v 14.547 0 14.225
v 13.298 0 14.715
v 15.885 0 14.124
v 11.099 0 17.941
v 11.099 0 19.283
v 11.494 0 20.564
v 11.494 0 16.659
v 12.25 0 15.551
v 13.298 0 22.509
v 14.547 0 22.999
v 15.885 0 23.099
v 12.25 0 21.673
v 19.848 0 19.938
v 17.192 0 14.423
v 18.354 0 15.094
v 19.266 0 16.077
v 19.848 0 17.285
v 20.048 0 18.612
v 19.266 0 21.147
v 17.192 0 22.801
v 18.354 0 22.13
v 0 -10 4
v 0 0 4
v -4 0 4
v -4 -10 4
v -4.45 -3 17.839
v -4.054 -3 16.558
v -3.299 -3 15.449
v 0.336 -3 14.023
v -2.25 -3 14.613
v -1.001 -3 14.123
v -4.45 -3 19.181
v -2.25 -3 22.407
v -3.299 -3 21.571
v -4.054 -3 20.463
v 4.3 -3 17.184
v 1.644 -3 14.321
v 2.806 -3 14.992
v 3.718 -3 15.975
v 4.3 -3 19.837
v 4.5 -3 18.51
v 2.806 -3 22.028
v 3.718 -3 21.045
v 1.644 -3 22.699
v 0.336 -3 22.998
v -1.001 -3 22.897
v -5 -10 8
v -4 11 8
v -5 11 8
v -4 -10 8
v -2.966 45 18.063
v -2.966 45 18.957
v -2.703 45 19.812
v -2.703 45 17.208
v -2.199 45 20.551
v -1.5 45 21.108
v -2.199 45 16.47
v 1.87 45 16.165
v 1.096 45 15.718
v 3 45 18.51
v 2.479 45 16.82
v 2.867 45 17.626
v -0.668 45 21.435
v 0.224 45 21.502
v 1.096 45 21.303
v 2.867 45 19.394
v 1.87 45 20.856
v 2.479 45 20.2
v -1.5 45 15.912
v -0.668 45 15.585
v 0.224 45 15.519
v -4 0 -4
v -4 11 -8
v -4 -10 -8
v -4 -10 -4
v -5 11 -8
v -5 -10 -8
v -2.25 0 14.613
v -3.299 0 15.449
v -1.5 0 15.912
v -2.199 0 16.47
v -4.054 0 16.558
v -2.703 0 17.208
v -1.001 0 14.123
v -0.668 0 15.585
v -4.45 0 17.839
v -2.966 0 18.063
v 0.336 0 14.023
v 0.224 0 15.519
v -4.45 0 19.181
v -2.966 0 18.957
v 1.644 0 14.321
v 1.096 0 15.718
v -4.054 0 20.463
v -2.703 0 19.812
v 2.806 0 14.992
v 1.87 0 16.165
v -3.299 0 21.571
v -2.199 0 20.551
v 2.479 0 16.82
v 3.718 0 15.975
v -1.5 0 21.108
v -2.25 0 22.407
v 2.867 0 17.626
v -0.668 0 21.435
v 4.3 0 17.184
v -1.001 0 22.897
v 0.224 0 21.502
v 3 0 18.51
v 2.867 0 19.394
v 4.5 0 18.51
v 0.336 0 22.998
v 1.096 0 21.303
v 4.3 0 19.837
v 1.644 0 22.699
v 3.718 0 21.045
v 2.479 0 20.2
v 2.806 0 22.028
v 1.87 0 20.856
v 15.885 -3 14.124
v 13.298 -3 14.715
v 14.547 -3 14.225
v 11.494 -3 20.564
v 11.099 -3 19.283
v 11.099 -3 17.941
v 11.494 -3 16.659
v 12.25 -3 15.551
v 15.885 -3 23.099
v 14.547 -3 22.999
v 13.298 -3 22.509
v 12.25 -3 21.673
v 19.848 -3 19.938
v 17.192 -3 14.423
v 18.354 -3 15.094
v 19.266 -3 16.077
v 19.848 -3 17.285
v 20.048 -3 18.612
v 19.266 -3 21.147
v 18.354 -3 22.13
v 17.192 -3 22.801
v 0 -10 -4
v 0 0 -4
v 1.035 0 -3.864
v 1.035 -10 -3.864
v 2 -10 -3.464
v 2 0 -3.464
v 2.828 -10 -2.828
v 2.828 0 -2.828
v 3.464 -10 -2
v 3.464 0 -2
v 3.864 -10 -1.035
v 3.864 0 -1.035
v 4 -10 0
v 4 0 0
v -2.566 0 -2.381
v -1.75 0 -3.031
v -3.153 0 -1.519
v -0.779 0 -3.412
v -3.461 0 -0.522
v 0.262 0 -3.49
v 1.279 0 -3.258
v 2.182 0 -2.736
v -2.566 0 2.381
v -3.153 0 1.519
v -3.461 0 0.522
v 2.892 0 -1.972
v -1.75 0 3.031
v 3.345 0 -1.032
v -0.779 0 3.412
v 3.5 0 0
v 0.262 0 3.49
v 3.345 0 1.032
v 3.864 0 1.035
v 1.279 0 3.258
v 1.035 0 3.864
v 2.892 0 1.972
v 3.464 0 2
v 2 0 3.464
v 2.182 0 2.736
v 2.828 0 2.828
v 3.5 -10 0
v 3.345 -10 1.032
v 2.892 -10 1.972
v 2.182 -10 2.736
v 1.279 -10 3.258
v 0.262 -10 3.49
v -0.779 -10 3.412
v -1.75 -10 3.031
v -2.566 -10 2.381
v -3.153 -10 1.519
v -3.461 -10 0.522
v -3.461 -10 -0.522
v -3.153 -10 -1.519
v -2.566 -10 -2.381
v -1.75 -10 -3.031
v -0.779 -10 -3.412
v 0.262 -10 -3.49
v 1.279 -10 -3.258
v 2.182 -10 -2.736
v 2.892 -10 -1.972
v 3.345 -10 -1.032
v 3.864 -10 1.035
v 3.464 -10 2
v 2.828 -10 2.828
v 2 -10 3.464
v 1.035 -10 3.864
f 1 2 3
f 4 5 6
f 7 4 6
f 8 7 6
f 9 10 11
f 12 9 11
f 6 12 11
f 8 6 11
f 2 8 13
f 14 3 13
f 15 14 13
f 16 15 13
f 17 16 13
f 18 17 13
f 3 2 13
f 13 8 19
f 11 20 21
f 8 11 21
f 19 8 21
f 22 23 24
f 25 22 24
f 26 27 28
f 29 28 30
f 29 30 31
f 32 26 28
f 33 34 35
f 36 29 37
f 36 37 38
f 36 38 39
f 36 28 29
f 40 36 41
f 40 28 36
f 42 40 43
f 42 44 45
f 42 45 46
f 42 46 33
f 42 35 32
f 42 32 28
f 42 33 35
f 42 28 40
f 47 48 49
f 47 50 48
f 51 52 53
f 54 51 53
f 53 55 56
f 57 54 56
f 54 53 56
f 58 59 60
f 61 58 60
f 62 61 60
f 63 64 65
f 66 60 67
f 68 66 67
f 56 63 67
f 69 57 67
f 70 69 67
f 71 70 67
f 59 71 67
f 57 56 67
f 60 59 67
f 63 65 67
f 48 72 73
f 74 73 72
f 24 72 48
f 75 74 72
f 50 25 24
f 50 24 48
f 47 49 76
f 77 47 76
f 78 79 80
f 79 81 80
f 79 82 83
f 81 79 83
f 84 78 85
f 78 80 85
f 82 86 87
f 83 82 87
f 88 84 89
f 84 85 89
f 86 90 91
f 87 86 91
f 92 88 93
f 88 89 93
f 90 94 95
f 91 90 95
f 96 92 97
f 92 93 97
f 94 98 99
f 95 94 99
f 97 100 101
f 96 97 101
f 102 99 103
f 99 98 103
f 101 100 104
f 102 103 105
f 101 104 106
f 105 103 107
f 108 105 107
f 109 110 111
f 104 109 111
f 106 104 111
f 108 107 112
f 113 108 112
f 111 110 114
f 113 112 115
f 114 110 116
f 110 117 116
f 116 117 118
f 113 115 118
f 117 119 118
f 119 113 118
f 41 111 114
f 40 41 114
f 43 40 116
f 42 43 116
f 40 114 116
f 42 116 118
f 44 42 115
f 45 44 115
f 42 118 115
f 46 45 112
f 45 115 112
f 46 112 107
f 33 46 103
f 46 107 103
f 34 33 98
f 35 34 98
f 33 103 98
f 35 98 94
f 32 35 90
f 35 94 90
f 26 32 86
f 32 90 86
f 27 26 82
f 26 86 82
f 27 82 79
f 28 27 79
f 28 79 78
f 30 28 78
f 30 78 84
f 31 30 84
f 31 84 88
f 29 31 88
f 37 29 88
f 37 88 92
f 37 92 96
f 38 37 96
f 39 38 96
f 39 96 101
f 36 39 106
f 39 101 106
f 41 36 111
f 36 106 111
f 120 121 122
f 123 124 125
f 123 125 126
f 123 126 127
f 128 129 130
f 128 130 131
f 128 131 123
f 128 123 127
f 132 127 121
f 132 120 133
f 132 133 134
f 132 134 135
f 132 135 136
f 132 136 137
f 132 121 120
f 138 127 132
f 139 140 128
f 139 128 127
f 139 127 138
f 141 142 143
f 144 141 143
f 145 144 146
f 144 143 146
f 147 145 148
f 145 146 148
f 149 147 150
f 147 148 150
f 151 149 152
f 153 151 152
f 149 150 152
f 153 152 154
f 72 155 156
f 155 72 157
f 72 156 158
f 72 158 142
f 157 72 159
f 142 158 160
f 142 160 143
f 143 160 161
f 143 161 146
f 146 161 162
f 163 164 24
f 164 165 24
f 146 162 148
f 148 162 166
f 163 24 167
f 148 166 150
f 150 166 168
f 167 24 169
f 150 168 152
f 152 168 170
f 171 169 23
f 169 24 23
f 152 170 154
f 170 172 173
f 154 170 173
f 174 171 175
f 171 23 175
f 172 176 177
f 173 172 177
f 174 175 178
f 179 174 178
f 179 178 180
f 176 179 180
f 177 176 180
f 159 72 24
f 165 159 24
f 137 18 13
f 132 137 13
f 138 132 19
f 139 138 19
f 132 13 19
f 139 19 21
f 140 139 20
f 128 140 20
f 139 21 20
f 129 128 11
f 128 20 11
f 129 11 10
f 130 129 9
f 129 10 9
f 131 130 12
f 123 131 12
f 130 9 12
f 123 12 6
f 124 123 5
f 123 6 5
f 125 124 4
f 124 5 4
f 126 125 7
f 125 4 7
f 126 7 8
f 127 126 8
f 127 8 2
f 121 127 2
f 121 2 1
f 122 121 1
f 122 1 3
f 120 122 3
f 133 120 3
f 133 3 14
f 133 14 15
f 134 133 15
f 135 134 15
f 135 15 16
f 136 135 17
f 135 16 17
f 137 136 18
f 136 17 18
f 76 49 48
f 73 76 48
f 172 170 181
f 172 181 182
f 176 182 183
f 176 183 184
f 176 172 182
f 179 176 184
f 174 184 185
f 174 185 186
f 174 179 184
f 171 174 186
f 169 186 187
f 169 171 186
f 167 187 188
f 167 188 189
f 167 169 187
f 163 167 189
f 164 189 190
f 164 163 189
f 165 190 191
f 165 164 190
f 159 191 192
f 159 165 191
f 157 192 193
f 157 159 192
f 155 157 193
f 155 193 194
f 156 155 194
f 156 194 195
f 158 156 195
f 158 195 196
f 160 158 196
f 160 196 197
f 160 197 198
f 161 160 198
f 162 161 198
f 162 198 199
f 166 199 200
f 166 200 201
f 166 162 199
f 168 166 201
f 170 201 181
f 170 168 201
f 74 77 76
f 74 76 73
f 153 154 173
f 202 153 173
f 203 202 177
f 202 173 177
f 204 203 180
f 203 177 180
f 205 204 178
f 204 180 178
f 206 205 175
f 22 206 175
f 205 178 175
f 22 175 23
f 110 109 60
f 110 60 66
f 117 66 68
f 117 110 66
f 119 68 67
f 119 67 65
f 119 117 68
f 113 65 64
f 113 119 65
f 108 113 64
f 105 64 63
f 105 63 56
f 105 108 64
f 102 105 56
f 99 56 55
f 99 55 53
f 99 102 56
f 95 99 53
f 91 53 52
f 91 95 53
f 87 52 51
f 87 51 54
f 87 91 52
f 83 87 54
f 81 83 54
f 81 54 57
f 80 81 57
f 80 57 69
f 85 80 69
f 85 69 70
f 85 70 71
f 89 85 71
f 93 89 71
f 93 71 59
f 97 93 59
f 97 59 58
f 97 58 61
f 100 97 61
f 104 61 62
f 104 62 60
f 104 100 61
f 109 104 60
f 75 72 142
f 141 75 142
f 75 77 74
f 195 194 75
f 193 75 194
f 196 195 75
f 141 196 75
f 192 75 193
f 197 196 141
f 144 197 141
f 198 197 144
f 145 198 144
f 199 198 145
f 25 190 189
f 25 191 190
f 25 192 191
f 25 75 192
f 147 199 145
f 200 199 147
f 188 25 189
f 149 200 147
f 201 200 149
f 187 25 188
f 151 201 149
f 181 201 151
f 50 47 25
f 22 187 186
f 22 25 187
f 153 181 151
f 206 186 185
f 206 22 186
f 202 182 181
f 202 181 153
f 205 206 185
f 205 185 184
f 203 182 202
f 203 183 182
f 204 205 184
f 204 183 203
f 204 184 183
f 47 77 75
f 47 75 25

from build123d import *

# Parameters (mm, degrees)
F0_R     = 3.5
F1_DEPTH = 10
F2_DEPTH = 11
F3_R     = 4.5
F3_R_2   = 3
F4_DEPTH = 3
F5_DEPTH = 45


with BuildPart() as f1:
    # F0 (on Front) → F1 (new body)
    with BuildSketch(Plane.XZ):
        with BuildLine():
            ThreePointArc((0, -4), (2.828427, -2.828427), (4, 0))
            ThreePointArc((4, 0), (2.828427, 2.828427), (0, 4))
            ThreePointArc((0, 4), (-2.828427, 2.828427), (-4, 0))
            ThreePointArc((-4, 0), (-2.828427, -2.828427), (0, -4))
        make_face()
        Circle(F0_R, mode=Mode.SUBTRACT)
        with BuildLine():
            ThreePointArc((-4, 0), (-2.828427, 2.828427), (0, 4))
            Line((0, 4), (-4, 4))
            Line((-4, 4), (-4, 0))
        make_face()
        with BuildLine():
            Line((-4, -4), (0, -4))
            ThreePointArc((0, -4), (-2.828427, -2.828427), (-4, 0))
            Line((-4, 0), (-4, -4))
        make_face()
        Polygon((-4, -4), (-4, 0), (-5, 0), (-5, -8), (-4, -8), align=None)
        Polygon((-5, 0), (-4, 0), (-4, 4), (-4, 8), (-5, 8), align=None)
    extrude(amount=F1_DEPTH)

    # F0 (on Front) → F2 (join)
    with BuildSketch(Plane.XZ):
        Polygon((-5, 0), (-4, 0), (-4, 4), (-4, 8), (-5, 8), align=None)
        Polygon((-4, -4), (-4, 0), (-5, 0), (-5, -8), (-4, -8), align=None)
    extrude(amount=-F2_DEPTH)


with BuildPart() as f4:
    # F3 (on Front) → F4 (new body)
    with BuildSketch(Plane.XZ):
        with Locations((0, 18.510151)):
            Circle(F3_R)
        with Locations((0, 18.510151)):
            Circle(F3_R_2, mode=Mode.SUBTRACT)
        with Locations((15.548322, 18.611893)):
            Circle(F3_R)
        with Locations((0, 18.510151)):
            Circle(F3_R_2)
    extrude(amount=F4_DEPTH)

    # F3 (on Front) → F5 (join)
    with BuildSketch(Plane.XZ):
        with Locations((0, 18.510151)):
            Circle(F3_R_2)
    extrude(amount=-F5_DEPTH)


solid = Compound([f1.part, f4.part])
